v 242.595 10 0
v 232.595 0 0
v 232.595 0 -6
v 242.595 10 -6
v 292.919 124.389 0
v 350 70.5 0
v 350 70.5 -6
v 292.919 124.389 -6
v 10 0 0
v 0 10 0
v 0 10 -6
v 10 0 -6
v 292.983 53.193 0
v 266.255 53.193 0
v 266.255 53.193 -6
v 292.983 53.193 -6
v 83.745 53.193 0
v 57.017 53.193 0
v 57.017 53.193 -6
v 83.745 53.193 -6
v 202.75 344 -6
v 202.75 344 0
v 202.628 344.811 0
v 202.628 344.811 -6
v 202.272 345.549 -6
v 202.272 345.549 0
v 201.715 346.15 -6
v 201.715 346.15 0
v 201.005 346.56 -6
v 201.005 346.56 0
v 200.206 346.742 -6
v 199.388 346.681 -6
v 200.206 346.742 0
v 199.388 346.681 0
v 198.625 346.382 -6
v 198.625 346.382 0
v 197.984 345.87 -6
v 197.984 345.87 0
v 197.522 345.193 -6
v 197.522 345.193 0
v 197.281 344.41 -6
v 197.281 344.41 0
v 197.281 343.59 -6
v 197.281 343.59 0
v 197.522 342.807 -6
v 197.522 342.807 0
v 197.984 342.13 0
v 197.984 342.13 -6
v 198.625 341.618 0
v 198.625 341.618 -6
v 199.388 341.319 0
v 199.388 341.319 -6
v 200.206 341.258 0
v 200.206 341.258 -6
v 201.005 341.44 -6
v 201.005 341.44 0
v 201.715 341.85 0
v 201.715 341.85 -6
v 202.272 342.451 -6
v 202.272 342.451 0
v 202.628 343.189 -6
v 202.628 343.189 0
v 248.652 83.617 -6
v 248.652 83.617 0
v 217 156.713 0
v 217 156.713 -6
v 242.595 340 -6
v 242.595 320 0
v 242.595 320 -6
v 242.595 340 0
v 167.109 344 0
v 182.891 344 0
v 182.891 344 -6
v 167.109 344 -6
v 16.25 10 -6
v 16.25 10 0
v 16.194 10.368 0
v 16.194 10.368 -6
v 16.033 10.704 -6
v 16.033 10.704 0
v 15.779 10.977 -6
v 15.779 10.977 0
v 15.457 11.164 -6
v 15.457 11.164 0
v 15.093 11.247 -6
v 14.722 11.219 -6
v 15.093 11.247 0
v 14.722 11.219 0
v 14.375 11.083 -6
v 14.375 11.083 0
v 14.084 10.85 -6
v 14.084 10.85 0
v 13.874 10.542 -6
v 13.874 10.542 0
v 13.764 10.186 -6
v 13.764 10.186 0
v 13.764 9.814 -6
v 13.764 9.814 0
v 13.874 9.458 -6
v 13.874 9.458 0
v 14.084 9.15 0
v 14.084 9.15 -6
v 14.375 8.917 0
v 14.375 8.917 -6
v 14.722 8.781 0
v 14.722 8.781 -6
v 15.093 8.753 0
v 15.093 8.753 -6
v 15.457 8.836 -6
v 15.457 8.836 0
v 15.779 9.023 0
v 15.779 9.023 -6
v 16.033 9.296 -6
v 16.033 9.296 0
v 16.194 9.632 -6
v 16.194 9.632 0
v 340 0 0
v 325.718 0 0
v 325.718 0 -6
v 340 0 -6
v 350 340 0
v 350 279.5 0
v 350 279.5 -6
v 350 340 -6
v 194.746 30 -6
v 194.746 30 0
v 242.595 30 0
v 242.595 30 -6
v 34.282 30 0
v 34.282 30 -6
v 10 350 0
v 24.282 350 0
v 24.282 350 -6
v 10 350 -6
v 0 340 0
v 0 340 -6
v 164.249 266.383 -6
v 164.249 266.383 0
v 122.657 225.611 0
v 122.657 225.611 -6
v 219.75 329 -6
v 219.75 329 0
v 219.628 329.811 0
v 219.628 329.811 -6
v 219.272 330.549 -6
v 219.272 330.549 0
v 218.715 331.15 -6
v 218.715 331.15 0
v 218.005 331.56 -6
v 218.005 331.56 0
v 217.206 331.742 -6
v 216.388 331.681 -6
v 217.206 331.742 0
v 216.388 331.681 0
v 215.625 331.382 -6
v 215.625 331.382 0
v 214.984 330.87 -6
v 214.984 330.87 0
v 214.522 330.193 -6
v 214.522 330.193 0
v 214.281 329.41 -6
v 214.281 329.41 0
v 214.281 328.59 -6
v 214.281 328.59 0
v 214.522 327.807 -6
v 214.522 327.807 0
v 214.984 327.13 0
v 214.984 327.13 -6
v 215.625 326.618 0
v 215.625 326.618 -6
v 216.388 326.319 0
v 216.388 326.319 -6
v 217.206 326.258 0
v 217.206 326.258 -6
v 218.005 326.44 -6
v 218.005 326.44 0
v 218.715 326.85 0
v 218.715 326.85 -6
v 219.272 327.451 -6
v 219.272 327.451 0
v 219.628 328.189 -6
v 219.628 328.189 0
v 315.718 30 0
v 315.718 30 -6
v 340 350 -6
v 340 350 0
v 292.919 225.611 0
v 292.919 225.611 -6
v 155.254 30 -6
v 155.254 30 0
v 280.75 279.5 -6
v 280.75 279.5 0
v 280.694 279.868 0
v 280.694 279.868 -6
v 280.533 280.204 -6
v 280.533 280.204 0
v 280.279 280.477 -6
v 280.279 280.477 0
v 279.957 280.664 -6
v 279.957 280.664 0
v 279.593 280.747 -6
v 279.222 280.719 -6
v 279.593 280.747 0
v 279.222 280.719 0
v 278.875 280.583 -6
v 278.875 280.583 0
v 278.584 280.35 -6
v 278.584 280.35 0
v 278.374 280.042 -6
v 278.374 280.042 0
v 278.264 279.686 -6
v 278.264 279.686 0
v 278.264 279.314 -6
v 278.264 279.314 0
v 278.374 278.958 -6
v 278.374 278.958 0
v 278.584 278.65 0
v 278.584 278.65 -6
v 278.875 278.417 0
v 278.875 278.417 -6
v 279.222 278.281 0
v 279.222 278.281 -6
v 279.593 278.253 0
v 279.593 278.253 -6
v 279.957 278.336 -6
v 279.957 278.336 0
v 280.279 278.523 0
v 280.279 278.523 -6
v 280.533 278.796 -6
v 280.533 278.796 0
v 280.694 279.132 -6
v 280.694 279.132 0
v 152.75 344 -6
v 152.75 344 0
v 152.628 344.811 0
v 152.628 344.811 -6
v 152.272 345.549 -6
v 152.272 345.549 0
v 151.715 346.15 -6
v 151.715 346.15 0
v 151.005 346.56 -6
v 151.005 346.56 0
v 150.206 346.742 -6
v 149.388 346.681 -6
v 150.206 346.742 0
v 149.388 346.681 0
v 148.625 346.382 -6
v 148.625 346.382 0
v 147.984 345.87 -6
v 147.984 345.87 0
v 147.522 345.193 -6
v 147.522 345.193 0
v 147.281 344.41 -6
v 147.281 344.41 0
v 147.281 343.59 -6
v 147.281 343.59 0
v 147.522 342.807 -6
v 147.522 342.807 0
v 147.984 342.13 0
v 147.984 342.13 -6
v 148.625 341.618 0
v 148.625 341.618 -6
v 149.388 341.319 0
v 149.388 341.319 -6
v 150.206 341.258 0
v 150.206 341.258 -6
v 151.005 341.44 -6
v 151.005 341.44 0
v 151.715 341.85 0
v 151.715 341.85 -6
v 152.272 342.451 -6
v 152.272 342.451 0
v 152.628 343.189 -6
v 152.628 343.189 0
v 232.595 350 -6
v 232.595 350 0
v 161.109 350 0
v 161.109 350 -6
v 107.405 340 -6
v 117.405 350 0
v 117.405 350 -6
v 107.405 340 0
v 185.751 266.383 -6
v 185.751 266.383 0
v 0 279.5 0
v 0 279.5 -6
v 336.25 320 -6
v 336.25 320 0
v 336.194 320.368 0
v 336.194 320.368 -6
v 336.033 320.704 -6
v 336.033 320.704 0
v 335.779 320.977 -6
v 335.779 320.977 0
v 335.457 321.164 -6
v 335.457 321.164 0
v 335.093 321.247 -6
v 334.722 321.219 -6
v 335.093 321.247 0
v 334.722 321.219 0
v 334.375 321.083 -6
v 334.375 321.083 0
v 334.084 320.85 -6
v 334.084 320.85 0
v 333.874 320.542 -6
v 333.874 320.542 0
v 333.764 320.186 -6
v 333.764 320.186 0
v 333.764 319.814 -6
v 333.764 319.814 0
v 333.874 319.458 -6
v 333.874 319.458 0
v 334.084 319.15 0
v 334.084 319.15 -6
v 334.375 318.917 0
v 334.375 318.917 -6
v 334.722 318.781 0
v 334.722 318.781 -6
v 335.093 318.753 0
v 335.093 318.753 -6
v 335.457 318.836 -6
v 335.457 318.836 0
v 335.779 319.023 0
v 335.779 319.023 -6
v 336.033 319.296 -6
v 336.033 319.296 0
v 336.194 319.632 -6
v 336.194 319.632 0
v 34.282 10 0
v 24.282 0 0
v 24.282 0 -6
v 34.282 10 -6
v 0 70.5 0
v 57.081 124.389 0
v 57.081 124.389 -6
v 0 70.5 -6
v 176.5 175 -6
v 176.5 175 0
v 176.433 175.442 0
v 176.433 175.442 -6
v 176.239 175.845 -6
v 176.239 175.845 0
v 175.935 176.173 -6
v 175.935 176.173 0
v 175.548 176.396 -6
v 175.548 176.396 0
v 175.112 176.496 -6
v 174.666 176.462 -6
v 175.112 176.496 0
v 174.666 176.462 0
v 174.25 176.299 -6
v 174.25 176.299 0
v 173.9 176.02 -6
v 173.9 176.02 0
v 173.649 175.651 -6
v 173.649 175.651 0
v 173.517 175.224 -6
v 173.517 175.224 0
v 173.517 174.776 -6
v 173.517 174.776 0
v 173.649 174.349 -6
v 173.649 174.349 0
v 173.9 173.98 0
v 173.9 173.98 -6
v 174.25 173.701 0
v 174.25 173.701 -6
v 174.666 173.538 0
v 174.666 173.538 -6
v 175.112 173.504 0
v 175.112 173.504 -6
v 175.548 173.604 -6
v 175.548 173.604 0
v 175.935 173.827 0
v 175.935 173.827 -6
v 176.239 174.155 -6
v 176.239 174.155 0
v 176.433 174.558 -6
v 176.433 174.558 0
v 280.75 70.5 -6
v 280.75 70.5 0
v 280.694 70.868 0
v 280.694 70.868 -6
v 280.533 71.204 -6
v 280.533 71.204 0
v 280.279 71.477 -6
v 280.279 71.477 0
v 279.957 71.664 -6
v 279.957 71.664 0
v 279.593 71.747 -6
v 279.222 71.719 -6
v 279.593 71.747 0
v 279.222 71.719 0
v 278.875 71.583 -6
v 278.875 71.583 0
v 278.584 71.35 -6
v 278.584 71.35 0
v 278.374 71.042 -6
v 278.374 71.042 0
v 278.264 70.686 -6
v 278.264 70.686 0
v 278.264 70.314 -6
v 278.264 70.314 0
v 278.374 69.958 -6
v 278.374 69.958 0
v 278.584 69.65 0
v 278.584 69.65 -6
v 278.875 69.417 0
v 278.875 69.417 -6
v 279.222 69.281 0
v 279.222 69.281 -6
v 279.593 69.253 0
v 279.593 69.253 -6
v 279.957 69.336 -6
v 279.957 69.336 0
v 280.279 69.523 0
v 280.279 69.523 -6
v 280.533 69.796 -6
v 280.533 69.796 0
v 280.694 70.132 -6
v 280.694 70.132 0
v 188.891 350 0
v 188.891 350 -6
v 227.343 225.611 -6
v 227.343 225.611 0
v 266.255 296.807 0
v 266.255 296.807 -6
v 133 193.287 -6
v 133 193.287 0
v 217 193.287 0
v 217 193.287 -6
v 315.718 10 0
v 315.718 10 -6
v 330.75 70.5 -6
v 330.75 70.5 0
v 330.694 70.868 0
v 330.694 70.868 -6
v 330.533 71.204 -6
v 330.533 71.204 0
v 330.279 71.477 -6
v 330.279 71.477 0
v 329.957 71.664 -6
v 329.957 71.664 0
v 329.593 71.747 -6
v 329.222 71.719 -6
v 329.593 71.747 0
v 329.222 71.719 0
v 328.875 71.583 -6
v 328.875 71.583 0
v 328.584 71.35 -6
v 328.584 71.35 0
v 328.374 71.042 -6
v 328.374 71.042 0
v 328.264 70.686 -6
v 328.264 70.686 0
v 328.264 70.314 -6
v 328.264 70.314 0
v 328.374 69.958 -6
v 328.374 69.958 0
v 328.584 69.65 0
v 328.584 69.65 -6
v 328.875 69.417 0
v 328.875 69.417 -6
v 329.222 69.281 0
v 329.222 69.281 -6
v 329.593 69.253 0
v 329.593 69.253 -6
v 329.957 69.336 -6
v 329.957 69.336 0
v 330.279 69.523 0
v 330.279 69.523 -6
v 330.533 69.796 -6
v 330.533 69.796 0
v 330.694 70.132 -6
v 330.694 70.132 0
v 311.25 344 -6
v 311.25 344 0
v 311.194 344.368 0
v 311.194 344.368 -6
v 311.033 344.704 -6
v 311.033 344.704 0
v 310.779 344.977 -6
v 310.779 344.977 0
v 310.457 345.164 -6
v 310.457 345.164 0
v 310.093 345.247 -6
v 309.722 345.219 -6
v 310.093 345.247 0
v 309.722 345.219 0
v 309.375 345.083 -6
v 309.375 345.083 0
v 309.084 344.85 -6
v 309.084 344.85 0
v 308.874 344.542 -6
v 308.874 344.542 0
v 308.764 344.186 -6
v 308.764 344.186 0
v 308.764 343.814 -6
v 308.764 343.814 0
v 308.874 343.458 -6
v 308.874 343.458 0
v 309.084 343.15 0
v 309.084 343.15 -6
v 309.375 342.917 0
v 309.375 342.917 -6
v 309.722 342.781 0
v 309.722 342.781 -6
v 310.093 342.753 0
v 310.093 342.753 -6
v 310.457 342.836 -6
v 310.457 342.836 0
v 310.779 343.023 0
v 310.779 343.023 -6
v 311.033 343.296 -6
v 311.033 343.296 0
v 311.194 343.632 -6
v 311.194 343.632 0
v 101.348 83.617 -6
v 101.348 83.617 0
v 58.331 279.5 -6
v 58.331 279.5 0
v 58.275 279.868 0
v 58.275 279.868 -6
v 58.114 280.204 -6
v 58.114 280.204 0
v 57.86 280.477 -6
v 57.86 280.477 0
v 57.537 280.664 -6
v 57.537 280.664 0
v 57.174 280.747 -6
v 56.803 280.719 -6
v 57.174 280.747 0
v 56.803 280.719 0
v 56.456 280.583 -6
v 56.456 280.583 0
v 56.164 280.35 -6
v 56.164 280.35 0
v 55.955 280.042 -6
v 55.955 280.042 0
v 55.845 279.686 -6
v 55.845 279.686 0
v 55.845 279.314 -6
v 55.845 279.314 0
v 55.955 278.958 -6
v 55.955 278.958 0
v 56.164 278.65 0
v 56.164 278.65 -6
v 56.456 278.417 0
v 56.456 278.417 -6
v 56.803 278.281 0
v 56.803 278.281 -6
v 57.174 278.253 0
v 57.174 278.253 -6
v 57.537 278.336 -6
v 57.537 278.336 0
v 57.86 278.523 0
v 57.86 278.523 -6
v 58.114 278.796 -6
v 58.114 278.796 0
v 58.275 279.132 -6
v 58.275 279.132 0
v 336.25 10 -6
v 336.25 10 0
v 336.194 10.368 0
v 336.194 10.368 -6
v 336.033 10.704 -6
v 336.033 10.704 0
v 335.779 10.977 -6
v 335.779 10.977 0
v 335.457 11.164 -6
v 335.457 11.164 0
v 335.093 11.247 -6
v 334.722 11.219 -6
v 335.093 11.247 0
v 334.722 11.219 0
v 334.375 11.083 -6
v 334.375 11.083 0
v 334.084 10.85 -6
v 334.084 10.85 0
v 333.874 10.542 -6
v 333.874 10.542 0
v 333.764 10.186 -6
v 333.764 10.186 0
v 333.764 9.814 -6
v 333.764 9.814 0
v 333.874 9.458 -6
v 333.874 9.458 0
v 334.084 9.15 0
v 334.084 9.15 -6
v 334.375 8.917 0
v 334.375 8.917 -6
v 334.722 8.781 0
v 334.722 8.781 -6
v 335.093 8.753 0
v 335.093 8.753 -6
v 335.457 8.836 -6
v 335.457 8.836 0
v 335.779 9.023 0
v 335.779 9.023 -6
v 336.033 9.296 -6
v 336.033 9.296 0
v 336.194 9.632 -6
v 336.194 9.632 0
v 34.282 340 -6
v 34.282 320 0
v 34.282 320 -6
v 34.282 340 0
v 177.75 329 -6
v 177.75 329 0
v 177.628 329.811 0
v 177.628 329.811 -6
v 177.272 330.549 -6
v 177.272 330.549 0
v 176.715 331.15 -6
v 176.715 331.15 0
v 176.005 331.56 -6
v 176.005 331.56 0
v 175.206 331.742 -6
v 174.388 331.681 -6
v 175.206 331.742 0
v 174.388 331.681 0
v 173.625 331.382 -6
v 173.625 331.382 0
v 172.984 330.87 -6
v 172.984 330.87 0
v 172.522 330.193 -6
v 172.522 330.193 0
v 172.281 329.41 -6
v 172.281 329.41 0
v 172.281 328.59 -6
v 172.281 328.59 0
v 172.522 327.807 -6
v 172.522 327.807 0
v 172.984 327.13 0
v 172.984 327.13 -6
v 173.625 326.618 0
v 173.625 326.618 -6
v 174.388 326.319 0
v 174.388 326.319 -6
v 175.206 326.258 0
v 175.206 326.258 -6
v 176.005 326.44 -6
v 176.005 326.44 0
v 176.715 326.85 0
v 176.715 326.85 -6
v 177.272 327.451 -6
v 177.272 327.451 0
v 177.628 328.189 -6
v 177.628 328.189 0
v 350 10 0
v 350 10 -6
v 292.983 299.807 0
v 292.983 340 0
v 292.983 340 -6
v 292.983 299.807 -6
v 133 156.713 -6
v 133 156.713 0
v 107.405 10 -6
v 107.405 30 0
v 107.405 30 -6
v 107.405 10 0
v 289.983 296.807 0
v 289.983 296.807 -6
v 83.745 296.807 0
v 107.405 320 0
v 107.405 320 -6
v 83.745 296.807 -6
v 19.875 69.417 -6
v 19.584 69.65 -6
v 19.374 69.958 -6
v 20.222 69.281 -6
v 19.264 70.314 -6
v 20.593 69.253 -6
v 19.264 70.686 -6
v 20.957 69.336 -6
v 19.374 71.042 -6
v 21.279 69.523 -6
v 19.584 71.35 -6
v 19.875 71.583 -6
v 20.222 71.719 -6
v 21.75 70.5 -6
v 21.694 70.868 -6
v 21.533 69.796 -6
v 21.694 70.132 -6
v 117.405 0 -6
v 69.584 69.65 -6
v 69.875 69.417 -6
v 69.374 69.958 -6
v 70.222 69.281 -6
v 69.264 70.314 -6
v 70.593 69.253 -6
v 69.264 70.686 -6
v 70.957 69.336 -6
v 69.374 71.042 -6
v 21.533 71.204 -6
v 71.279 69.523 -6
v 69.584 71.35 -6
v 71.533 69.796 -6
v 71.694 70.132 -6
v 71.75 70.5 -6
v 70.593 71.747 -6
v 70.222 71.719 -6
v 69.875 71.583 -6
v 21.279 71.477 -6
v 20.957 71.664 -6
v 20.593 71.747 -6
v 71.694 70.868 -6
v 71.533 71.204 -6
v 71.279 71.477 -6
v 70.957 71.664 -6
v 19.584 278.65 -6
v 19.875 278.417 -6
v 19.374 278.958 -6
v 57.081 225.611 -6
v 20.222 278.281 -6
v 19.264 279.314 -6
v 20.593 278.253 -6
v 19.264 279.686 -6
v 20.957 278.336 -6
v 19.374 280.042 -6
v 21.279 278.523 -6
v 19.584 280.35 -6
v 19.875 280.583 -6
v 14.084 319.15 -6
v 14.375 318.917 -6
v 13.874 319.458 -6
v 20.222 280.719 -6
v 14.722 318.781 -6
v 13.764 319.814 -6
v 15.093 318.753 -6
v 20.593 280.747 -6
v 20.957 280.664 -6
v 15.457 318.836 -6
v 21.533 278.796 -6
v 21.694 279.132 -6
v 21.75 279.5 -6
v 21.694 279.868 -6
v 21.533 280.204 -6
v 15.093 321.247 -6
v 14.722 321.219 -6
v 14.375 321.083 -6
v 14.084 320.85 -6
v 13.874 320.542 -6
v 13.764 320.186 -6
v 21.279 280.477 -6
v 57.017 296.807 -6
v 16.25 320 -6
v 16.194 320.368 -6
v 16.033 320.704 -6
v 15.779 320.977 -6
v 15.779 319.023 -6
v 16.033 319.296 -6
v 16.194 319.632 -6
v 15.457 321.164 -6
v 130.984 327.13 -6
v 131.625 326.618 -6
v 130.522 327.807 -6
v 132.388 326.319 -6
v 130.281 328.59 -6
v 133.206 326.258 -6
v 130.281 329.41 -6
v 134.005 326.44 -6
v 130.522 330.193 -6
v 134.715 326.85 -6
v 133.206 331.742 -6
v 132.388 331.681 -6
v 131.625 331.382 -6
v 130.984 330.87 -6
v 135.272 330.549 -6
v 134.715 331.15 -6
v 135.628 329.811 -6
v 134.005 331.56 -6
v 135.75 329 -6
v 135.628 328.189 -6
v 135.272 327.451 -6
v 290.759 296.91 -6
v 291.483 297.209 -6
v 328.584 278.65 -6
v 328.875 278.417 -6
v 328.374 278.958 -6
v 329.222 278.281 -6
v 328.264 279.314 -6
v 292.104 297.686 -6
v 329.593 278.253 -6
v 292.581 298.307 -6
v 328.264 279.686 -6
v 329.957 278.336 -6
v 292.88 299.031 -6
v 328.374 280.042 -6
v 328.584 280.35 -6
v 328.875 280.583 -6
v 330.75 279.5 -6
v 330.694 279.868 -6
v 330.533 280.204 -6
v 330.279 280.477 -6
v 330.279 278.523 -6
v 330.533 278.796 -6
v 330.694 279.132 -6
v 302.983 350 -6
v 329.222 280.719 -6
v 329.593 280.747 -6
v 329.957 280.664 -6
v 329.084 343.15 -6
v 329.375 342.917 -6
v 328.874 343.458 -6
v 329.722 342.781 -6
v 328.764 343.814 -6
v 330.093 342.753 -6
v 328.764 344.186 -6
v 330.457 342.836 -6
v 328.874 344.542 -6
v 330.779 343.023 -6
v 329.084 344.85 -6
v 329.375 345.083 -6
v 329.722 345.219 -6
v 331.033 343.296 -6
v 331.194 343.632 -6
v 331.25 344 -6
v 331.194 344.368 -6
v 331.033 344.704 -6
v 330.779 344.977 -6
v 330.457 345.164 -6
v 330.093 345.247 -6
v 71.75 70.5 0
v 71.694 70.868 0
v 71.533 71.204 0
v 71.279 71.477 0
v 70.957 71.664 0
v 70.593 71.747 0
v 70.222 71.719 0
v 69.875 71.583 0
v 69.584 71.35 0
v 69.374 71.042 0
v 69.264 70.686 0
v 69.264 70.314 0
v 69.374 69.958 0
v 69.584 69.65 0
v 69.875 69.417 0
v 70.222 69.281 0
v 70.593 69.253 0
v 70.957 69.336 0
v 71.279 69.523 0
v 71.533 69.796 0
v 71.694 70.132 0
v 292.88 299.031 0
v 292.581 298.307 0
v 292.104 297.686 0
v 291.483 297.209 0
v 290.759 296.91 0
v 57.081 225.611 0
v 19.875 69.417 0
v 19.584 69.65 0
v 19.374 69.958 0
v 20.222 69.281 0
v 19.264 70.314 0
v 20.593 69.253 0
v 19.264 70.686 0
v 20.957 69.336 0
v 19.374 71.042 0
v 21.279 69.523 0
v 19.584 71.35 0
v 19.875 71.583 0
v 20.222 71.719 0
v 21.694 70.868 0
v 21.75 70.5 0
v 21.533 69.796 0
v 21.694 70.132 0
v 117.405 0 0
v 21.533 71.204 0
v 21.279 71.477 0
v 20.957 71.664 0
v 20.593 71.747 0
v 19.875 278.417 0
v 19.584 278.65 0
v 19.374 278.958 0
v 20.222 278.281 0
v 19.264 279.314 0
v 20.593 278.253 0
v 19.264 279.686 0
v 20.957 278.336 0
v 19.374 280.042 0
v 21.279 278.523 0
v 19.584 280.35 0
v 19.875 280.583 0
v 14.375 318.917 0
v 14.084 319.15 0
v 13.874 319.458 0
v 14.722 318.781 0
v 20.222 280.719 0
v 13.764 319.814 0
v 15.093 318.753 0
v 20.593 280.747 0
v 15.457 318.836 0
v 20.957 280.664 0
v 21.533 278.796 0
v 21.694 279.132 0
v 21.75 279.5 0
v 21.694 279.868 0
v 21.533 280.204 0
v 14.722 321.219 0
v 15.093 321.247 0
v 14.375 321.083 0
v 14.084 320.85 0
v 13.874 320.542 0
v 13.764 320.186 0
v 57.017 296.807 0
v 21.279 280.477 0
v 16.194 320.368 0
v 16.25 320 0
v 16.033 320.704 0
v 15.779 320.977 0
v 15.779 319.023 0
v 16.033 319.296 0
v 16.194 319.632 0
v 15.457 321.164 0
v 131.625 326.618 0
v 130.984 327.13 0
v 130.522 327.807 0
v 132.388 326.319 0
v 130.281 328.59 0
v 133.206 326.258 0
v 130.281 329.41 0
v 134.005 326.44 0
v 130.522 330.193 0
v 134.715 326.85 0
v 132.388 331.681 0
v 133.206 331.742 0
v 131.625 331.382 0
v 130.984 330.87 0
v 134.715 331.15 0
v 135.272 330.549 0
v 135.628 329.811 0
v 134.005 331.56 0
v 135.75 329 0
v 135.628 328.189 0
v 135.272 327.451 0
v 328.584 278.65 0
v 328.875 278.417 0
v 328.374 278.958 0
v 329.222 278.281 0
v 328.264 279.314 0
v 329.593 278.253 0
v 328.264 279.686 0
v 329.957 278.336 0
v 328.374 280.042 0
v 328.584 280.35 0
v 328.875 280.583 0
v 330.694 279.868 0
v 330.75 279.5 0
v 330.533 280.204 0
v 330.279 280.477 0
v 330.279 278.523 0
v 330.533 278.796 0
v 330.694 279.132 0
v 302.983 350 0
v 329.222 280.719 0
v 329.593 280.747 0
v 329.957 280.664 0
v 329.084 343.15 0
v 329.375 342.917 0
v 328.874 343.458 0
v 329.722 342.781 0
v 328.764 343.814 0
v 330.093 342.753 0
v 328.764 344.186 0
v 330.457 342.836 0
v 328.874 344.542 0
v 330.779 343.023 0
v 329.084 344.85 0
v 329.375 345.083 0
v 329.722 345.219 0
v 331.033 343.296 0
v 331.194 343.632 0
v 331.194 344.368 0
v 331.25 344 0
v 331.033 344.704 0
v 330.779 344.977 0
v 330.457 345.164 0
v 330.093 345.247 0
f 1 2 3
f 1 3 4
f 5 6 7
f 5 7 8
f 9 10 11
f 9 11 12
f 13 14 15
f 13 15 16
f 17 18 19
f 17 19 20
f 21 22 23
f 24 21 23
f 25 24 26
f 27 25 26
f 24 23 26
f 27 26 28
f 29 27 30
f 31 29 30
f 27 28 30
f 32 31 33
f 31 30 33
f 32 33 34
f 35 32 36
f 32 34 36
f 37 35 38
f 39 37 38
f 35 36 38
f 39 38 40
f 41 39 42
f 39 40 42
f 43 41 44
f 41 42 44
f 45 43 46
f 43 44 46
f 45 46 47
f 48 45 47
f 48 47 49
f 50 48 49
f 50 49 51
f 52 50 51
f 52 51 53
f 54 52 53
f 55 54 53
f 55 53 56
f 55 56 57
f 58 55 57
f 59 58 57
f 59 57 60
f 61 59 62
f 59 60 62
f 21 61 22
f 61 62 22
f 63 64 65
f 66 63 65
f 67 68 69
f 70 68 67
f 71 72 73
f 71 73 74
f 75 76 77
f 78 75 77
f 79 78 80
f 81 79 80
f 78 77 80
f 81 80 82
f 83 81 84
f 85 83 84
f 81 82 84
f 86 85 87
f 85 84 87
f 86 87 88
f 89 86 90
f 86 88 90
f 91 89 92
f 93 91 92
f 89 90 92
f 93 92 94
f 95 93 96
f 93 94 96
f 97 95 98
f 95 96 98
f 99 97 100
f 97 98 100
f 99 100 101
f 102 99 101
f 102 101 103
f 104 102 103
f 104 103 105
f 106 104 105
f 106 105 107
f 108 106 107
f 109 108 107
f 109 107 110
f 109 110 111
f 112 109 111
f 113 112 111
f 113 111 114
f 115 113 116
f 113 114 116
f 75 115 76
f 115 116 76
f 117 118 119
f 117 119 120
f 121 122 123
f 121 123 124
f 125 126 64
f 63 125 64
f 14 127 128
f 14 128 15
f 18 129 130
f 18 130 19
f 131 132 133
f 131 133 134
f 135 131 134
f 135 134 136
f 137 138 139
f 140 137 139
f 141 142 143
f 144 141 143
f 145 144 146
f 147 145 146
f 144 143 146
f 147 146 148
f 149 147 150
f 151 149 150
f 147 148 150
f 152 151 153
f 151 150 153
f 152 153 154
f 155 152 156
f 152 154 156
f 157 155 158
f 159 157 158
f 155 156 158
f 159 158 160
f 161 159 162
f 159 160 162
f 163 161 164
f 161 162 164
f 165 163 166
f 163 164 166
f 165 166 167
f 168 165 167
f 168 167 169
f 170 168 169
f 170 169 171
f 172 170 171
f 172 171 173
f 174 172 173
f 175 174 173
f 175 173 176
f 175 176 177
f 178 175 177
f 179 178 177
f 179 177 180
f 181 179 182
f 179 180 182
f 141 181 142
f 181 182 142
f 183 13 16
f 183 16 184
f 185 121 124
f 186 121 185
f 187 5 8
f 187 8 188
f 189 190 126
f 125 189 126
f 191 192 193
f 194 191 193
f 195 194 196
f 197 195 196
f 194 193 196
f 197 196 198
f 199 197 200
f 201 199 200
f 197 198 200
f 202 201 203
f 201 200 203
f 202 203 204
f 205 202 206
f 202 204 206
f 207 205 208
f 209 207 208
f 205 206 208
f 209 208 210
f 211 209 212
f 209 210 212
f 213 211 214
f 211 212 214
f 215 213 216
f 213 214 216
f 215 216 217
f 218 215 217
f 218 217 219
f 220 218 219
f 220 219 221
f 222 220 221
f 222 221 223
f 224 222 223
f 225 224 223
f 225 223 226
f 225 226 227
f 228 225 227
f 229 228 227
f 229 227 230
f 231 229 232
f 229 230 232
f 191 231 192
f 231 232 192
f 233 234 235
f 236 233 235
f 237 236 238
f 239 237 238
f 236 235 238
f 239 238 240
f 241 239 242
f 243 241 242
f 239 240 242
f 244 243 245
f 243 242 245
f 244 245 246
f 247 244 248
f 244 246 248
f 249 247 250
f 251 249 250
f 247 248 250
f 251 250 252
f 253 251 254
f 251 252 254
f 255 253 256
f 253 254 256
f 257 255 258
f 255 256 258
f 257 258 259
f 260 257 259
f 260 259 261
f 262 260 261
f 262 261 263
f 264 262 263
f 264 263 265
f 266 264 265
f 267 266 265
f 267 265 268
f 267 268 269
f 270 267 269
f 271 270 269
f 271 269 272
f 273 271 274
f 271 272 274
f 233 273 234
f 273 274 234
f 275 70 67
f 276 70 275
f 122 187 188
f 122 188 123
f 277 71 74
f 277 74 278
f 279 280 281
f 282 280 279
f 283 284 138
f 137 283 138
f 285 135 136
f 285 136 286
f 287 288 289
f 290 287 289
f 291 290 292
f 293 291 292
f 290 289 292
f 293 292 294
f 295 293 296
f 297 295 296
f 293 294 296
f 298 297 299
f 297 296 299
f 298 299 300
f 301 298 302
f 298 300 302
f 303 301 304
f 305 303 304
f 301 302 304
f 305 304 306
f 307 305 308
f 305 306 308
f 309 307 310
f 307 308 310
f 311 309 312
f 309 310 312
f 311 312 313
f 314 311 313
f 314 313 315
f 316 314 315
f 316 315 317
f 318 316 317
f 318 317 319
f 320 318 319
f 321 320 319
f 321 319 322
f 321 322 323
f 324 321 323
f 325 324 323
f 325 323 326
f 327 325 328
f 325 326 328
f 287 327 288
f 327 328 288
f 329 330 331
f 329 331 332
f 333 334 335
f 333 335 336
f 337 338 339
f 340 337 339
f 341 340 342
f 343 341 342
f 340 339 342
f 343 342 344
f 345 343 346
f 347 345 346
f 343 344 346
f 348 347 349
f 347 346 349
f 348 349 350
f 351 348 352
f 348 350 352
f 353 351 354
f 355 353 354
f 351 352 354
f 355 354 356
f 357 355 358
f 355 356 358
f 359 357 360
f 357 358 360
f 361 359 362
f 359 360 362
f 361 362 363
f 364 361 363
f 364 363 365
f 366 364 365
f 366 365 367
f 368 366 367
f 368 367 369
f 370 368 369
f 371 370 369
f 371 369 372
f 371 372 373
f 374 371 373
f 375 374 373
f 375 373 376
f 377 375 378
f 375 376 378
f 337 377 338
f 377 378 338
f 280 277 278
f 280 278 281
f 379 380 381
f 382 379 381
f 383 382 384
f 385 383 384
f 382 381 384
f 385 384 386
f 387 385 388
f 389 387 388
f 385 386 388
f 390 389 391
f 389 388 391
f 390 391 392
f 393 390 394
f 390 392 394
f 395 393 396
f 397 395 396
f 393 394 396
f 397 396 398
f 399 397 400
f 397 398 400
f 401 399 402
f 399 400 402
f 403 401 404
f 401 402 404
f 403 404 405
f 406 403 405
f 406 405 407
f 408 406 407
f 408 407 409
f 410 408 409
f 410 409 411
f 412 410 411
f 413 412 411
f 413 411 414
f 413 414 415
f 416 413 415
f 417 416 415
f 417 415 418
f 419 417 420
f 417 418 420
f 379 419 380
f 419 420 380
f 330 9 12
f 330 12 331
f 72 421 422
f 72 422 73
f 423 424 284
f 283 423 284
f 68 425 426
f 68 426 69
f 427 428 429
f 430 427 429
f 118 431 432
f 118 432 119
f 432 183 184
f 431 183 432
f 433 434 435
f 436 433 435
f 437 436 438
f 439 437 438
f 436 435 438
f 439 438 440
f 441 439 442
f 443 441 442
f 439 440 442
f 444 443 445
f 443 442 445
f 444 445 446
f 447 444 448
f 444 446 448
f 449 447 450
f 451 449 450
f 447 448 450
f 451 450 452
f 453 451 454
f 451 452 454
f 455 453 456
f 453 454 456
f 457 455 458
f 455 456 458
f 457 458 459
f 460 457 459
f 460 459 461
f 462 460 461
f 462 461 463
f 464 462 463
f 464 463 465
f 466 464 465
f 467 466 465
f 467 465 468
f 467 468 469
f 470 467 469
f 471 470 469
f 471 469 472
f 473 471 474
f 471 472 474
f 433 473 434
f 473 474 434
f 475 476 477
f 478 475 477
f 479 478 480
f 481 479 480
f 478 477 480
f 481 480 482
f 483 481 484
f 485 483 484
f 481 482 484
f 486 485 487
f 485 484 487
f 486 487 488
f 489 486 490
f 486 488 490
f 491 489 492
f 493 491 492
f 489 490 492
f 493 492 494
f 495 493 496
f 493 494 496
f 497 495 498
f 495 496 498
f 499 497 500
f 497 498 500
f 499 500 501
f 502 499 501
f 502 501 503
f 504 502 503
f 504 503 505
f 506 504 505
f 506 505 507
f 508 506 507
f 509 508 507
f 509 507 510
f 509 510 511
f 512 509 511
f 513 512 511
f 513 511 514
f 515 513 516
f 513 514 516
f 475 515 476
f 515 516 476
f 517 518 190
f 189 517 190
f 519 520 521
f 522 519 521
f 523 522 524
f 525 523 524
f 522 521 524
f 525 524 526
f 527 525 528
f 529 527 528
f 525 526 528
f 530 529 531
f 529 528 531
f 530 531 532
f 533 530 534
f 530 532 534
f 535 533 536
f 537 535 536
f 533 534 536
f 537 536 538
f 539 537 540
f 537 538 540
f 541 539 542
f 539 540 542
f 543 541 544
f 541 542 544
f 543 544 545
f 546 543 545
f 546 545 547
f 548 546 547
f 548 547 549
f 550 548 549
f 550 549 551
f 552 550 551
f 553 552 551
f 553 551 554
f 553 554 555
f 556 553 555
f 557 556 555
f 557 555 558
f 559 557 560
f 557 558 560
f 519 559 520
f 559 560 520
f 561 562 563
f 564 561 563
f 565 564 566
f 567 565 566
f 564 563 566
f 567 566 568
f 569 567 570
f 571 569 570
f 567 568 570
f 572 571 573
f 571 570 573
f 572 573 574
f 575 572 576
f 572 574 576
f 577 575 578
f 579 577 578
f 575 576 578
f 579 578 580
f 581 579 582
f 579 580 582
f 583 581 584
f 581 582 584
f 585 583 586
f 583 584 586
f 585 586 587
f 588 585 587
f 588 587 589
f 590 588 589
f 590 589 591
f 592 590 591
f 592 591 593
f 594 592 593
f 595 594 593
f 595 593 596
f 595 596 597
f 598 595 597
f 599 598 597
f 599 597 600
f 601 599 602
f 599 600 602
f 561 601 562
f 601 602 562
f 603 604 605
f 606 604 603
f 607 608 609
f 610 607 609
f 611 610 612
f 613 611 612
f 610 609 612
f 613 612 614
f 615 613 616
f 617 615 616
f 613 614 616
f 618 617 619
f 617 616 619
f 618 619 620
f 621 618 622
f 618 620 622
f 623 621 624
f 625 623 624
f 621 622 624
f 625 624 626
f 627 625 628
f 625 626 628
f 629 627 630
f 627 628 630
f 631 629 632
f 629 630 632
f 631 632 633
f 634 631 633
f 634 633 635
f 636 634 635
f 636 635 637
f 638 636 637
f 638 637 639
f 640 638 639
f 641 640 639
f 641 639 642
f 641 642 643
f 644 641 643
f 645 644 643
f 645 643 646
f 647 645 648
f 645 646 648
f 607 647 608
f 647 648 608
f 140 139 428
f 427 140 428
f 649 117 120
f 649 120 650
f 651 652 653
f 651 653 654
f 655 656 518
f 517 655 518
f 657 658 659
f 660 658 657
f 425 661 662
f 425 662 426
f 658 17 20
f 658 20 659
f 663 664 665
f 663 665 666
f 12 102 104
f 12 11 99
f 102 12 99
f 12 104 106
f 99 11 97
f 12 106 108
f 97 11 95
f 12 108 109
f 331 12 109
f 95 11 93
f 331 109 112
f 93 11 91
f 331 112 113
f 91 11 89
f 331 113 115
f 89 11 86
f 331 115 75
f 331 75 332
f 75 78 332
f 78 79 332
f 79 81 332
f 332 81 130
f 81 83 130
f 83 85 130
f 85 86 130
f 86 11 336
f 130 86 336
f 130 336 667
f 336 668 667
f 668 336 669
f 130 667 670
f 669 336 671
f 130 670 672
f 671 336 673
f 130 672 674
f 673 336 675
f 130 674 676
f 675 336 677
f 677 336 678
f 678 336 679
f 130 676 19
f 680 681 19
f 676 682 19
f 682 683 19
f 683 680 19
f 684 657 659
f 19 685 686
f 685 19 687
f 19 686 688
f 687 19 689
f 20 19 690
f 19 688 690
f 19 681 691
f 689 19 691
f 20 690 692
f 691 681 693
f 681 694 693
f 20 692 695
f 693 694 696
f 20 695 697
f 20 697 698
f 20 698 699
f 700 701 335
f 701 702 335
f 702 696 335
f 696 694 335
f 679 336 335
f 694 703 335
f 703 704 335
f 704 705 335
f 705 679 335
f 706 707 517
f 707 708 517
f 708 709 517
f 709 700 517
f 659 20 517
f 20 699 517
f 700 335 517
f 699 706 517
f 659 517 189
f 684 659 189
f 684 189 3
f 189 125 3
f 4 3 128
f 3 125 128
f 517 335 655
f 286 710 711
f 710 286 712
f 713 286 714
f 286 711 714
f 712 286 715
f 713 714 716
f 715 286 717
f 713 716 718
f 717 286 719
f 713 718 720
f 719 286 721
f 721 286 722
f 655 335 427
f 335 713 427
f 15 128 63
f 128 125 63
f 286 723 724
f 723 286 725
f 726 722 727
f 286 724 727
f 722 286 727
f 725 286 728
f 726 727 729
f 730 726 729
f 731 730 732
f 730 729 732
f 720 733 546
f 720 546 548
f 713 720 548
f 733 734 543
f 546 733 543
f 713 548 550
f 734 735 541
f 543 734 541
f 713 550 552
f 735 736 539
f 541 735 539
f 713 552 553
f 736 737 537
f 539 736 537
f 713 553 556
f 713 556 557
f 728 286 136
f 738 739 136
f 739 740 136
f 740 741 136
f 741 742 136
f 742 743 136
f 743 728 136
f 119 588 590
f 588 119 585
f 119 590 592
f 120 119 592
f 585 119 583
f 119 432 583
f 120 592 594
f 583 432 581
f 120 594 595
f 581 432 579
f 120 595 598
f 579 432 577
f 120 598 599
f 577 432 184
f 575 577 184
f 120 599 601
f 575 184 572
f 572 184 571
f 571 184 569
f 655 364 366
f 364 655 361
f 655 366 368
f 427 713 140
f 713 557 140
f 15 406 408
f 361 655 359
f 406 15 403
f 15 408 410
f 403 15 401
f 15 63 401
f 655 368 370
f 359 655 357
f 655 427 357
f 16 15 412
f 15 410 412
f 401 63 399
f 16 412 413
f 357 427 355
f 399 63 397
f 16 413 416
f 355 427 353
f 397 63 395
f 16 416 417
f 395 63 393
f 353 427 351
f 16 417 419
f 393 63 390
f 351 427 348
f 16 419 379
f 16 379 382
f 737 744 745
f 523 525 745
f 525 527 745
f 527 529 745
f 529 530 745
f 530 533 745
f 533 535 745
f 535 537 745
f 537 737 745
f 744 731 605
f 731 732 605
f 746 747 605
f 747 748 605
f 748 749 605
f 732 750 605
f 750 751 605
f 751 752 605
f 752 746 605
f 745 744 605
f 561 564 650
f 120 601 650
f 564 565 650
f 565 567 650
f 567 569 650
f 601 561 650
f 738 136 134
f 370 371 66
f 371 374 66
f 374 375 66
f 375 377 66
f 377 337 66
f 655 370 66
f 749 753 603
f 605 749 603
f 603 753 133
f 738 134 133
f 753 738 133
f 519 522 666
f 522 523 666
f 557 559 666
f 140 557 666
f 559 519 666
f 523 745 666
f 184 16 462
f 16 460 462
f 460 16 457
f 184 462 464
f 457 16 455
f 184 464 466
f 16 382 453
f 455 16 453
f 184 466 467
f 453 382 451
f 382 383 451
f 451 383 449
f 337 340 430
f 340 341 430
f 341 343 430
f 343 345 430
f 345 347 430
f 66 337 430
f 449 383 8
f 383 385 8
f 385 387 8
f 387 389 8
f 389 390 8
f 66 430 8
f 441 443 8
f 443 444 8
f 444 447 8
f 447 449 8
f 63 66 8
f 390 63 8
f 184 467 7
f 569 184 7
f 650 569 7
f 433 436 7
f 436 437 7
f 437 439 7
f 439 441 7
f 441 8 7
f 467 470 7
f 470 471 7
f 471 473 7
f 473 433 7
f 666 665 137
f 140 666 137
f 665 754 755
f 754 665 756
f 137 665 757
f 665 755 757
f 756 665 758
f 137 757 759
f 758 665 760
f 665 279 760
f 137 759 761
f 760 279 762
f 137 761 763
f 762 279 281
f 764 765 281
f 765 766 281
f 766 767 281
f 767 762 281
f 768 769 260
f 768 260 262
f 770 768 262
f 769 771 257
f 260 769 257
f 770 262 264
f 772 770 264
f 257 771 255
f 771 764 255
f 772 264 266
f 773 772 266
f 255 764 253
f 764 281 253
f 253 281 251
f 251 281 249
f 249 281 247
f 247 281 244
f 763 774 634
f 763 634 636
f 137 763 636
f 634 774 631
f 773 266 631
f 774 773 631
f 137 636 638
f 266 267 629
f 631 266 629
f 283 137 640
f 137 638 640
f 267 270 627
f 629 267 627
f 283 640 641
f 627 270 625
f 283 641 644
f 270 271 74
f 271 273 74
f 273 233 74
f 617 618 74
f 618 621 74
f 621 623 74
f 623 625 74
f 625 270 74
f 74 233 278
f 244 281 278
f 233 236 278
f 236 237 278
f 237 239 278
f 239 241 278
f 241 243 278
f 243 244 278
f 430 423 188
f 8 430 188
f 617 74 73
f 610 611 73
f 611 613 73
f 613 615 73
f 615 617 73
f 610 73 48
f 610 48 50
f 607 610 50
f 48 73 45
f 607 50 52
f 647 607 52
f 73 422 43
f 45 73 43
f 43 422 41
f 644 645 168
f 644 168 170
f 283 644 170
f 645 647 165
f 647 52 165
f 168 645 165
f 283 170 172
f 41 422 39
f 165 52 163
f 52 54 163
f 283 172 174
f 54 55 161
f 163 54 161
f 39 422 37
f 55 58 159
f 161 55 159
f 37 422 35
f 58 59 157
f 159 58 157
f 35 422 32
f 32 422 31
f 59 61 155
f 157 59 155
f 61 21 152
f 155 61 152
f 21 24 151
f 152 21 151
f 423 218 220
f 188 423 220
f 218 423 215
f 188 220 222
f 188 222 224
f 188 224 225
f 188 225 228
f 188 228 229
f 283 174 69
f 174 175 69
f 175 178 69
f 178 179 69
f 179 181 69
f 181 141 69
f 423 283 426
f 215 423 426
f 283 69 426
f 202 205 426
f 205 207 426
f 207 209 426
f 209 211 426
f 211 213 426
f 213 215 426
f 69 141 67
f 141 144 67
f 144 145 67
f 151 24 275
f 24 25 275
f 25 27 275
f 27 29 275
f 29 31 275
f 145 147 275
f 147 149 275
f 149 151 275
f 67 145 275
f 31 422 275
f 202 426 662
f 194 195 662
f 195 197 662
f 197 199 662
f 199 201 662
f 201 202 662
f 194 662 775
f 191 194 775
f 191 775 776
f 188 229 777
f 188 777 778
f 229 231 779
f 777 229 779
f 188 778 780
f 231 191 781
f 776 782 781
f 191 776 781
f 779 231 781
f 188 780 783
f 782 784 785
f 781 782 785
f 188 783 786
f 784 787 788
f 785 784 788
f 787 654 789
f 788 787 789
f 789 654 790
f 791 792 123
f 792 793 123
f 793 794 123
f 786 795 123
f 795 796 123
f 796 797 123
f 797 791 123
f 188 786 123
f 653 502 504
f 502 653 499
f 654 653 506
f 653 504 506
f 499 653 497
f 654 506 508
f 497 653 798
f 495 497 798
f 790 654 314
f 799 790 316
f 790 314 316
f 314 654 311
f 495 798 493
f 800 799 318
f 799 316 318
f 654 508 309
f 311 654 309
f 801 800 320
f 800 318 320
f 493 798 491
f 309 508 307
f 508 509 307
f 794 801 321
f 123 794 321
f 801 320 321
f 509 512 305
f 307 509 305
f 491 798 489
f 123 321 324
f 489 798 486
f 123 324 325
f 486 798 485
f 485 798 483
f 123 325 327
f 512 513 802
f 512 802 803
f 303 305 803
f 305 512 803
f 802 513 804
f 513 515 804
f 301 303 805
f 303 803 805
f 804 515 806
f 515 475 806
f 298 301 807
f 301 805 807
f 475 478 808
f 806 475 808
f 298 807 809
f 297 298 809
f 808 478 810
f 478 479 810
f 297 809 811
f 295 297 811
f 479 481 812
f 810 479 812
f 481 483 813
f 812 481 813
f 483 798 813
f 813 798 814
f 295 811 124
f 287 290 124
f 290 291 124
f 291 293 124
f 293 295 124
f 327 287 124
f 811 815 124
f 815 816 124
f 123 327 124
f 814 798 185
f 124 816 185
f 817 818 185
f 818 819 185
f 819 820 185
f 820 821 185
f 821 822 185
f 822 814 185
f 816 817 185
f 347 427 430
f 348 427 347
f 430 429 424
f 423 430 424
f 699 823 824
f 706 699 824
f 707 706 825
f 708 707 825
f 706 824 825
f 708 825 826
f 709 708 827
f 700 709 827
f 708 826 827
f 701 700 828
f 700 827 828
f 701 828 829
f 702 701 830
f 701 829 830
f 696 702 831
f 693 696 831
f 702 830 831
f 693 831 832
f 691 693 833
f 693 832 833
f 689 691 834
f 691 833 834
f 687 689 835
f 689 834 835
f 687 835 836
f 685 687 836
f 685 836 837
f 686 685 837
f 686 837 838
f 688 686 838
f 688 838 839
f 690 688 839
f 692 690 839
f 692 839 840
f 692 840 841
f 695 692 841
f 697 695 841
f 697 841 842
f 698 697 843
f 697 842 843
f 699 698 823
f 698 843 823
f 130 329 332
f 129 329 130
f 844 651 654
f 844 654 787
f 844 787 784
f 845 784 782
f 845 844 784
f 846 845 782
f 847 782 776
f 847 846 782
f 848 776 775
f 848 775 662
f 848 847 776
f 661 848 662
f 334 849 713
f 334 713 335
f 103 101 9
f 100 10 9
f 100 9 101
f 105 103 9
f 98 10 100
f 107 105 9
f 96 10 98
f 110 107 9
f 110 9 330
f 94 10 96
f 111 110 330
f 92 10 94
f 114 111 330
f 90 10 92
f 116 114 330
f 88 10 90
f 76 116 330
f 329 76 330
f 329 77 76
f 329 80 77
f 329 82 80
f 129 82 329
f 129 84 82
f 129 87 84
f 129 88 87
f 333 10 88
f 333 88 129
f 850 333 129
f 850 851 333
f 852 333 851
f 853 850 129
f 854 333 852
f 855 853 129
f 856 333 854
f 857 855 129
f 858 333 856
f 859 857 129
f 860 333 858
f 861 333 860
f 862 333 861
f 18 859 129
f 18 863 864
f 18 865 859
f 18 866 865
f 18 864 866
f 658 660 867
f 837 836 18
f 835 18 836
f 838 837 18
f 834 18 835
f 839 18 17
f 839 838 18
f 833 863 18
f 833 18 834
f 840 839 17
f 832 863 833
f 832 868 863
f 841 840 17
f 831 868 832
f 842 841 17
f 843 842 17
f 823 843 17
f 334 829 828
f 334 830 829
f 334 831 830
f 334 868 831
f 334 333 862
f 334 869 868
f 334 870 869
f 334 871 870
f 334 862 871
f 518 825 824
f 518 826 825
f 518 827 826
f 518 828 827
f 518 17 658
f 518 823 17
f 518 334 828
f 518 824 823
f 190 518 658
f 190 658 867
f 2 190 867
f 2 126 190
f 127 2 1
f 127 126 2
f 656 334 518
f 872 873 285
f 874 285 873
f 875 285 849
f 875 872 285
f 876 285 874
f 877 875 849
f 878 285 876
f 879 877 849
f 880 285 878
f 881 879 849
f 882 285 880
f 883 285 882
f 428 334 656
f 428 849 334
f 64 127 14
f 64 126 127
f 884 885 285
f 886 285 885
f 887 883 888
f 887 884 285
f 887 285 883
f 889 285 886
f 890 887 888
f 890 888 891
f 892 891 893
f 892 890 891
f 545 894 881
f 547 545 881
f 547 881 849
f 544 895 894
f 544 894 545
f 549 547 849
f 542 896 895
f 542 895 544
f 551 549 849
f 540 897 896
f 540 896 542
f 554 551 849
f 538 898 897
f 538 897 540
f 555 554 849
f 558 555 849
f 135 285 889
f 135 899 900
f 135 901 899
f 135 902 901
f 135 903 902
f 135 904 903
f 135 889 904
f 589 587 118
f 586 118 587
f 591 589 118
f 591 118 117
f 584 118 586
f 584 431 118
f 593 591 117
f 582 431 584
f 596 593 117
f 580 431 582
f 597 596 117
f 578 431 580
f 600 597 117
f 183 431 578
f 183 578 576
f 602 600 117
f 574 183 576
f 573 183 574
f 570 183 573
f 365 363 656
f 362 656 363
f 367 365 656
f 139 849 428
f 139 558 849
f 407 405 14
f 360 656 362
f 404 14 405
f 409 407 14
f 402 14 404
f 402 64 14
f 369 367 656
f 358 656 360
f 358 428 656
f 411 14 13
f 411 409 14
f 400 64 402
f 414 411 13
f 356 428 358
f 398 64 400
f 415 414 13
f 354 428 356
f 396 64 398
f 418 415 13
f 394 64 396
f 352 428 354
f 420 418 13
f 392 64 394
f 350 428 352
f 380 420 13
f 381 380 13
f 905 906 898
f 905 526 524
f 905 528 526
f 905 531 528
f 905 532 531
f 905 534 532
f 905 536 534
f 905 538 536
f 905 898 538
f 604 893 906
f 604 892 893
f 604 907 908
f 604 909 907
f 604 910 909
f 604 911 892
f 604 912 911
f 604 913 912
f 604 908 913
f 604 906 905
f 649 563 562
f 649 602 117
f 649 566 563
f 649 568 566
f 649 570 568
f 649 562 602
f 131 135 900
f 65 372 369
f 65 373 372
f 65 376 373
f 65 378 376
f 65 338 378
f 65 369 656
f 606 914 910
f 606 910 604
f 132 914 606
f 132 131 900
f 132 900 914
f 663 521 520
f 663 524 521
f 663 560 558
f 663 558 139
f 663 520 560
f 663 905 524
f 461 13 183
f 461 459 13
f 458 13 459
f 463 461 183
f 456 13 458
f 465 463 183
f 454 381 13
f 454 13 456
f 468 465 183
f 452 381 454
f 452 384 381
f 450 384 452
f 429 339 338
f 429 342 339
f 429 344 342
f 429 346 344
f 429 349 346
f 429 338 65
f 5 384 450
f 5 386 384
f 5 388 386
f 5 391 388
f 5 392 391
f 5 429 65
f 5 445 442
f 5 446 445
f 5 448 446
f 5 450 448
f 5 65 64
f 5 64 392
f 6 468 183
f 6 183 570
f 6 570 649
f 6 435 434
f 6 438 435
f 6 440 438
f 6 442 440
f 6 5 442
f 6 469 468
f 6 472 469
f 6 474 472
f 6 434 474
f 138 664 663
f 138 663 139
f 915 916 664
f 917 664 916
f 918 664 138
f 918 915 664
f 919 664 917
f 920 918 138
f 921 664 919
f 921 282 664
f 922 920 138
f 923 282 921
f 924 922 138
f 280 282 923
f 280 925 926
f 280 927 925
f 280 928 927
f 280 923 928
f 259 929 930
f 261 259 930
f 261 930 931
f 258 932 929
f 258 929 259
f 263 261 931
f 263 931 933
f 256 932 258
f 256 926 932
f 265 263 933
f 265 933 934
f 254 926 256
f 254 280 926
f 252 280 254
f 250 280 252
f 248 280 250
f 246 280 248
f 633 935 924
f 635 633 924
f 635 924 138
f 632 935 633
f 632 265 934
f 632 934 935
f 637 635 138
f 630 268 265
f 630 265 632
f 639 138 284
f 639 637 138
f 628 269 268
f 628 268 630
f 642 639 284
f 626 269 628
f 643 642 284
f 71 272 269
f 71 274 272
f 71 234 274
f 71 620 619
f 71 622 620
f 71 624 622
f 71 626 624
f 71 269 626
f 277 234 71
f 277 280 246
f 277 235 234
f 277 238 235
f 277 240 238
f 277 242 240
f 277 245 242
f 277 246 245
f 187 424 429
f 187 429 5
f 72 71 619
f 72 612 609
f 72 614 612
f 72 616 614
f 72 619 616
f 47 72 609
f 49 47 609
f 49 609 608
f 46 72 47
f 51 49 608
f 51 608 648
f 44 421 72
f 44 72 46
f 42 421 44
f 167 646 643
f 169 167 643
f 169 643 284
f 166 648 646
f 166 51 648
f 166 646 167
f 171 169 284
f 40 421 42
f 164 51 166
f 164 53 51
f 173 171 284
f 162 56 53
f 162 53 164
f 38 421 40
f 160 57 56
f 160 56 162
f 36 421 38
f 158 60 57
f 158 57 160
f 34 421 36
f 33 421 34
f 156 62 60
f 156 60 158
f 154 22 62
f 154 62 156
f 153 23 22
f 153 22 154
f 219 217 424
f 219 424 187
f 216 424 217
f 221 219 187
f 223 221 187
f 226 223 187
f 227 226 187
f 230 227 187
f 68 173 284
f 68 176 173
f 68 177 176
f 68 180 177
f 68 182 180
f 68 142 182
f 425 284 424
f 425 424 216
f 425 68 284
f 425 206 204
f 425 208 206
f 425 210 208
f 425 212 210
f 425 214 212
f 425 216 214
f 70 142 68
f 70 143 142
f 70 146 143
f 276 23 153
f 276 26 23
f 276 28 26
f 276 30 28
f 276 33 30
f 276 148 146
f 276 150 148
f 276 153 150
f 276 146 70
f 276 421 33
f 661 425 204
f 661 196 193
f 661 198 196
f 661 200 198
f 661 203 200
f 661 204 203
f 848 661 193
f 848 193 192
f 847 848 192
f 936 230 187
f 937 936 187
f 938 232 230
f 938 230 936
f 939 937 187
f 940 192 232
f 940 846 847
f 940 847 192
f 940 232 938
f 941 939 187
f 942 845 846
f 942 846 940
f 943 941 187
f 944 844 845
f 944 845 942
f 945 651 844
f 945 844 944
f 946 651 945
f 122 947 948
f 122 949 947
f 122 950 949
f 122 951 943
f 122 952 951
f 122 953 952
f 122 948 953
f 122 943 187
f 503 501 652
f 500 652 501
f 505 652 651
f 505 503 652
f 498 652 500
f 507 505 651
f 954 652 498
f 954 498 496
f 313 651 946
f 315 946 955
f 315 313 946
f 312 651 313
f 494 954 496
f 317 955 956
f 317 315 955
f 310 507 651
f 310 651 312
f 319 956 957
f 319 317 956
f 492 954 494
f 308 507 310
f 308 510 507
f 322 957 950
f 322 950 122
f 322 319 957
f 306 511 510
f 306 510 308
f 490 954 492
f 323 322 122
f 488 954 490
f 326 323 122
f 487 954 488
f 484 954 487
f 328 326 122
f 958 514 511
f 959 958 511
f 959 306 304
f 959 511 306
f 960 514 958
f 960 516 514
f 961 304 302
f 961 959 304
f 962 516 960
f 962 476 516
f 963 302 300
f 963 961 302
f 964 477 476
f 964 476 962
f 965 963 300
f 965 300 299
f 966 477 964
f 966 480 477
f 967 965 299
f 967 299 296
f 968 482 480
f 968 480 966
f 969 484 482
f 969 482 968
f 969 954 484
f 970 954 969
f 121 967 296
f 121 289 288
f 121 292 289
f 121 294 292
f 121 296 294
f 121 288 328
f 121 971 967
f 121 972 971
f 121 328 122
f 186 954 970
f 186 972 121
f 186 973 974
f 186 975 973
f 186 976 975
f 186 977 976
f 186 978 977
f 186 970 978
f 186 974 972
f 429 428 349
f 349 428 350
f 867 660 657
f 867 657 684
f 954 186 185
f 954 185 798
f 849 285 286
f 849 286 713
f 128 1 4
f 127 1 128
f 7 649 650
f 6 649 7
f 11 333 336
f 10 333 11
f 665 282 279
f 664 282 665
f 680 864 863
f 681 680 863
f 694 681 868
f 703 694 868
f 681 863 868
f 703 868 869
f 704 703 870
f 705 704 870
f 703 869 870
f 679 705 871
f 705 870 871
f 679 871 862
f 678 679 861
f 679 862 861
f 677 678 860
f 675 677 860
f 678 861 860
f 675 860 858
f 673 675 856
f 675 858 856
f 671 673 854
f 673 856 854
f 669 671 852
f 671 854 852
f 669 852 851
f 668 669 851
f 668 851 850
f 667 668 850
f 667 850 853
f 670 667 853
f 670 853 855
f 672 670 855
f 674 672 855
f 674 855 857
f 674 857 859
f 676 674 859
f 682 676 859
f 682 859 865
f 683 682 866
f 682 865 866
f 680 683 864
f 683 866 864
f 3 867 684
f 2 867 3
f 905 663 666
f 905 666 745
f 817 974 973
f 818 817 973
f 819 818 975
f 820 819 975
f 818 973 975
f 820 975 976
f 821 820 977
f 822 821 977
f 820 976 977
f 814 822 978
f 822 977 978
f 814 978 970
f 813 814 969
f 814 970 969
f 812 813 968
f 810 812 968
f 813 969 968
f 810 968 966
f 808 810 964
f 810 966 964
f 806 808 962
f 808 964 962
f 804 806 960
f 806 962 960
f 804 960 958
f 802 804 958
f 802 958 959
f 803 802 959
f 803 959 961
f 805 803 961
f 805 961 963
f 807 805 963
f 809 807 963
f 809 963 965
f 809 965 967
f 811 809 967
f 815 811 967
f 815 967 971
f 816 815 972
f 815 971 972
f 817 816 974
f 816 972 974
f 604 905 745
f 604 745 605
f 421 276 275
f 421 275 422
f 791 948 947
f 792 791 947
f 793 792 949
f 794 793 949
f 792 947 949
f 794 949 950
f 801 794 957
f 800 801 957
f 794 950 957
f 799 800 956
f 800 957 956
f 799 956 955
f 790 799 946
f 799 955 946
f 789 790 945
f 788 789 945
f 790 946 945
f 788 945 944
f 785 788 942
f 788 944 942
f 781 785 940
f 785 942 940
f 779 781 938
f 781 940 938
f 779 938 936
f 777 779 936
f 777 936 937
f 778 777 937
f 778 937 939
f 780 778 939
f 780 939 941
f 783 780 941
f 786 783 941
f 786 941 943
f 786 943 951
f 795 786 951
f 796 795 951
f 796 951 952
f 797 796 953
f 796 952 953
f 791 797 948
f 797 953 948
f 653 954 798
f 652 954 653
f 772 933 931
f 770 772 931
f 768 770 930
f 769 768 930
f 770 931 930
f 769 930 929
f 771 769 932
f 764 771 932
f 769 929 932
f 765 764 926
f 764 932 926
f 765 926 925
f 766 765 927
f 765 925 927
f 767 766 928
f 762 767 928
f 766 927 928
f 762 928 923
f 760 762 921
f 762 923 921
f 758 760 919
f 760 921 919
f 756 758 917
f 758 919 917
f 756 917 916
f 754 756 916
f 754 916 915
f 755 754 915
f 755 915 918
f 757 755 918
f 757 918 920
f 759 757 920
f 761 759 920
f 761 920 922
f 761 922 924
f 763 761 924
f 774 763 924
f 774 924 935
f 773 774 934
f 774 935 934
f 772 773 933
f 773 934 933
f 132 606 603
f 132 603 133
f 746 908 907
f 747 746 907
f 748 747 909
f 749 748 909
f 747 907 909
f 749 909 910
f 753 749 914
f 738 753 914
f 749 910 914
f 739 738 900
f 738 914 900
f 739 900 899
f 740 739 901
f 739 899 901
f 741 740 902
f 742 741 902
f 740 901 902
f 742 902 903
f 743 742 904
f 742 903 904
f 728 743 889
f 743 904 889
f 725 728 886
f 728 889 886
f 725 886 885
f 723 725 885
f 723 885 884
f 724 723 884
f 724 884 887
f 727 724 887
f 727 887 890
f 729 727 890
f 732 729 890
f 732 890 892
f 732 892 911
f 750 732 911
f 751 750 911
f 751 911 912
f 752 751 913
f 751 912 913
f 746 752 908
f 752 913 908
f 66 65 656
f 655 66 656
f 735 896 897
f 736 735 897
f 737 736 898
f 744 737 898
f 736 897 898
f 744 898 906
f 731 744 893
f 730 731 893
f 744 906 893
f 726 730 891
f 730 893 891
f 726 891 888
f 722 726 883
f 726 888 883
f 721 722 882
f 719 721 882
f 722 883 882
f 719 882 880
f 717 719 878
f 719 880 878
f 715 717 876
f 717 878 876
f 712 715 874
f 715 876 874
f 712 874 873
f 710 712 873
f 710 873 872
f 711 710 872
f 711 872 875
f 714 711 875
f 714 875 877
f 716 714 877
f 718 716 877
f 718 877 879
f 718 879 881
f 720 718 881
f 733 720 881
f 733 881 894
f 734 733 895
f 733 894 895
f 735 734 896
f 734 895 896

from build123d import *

# Parameters (mm, degrees)
SCHIZZO13_R                  = 1.25
SCHIZZO13_R_2                = 1.5
SCHIZZO13_R_3                = 2.75
ESTRUSIONE_ESTRUSIONE2_DEPTH = 6


with BuildPart() as part:
    # Schizzo13 → Estrusione-Estrusione2 (new body)
    with BuildSketch(Plane.XY):
        with BuildLine():
            Line((10, 0), (24.28195797, 0))
            Line((24.28195797, 0), (34.28195797, 10))
            Line((34.28195797, 10), (34.28195797, 30))
            Line((34.28195797, 30), (57.017366293, 53.192694567))
            Line((57.017366293, 53.192694567), (83.745372993, 53.192694567))
            Line((83.745372993, 53.192694567), (107.404551383, 30))
            Line((107.404551383, 30), (107.404551383, 10))
            Line((107.404551383, 10), (117.404551383, 0))
            Line((117.404551383, 0), (232.595448617, 0))
            Line((232.595448617, 0), (242.595448617, 10))
            Line((242.595448617, 10), (242.595448617, 30))
            Line((242.595448617, 30), (266.254627007, 53.192694567))
            Line((266.254627007, 53.192694567), (292.982633707, 53.192694567))
            Line((292.982633707, 53.192694567), (315.71804203, 30))
            Line((315.71804203, 30), (315.71804203, 10))
            Line((315.71804203, 10), (325.71804203, 0))
            Line((325.71804203, 0), (340, 0))
            Line((340, 0), (350, 10))
            Line((350, 10), (350, 70.5))
            Line((350, 70.5), (292.919241786, 124.388863529))
            Line((292.919241786, 124.388863529), (292.919241786, 225.611136471))
            Line((292.919241786, 225.611136471), (350, 279.5))
            Line((350, 279.5), (350, 340))
            Line((350, 340), (340, 350))
            Line((340, 350), (302.982633707, 350))
            Line((302.982633707, 350), (292.982633707, 340))
            Line((292.982633707, 340), (292.982633707, 299.807305433))
            ThreePointArc((292.982633707, 299.807305433), (292.103954051, 297.685985089), (289.982633707, 296.807305433))
            Line((289.982633707, 296.807305433), (266.254627007, 296.807305433))
            Line((266.254627007, 296.807305433), (242.595448617, 320))
            Line((242.595448617, 320), (242.595448617, 340))
            Line((242.595448617, 340), (232.595448617, 350))
            Line((232.595448617, 350), (188.89112909, 350))
            Line((188.89112909, 350), (182.89112909, 344))
            Line((182.89112909, 344), (167.10887091, 344))
            Line((167.10887091, 344), (161.10887091, 350))
            Line((161.10887091, 350), (117.404551383, 350))
            Line((117.404551383, 350), (107.404551383, 340))
            Line((107.404551383, 340), (107.404551383, 320))
            Line((107.404551383, 320), (83.745372993, 296.807305433))
            Line((83.745372993, 296.807305433), (57.017366293, 296.807305433))
            Line((57.017366293, 296.807305433), (34.28195797, 320))
            Line((34.28195797, 320), (34.28195797, 340))
            Line((34.28195797, 340), (24.28195797, 350))
            Line((24.28195797, 350), (10, 350))
            Line((10, 350), (0, 340))
            Line((0, 340), (0, 279.5))
            Line((0, 279.5), (57.080758214, 225.611136471))
            Line((57.080758214, 225.611136471), (57.080758214, 175))
            Line((57.080758214, 175), (57.080758214, 124.388863529))
            Line((57.080758214, 124.388863529), (0, 70.5))
            Line((0, 70.5), (0, 10))
            Line((0, 10), (10, 0))
        make_face()
        with Locations((15, 320)):
            Circle(SCHIZZO13_R, mode=Mode.SUBTRACT)
        with Locations((20.5, 279.5)):
            Circle(SCHIZZO13_R, mode=Mode.SUBTRACT)
        with Locations((57.080758214, 279.5)):
            Circle(SCHIZZO13_R, mode=Mode.SUBTRACT)
        with Locations((175, 175)):
            Circle(SCHIZZO13_R_2, mode=Mode.SUBTRACT)
        with Locations((20.5, 70.5)):
            Circle(SCHIZZO13_R, mode=Mode.SUBTRACT)
        with Locations((200, 344)):
            Circle(SCHIZZO13_R_3, mode=Mode.SUBTRACT)
        with Locations((150, 344)):
            Circle(SCHIZZO13_R_3, mode=Mode.SUBTRACT)
        with Locations((175, 329)):
            Circle(SCHIZZO13_R_3, mode=Mode.SUBTRACT)
        with Locations((217, 329)):
            Circle(SCHIZZO13_R_3, mode=Mode.SUBTRACT)
        with Locations((133, 329)):
            Circle(SCHIZZO13_R_3, mode=Mode.SUBTRACT)
        with Locations((70.5, 70.5)):
            Circle(SCHIZZO13_R, mode=Mode.SUBTRACT)
        with Locations((279.5, 70.5)):
            Circle(SCHIZZO13_R, mode=Mode.SUBTRACT)
        with Locations((329.5, 70.5)):
            Circle(SCHIZZO13_R, mode=Mode.SUBTRACT)
        with Locations((335, 10)):
            Circle(SCHIZZO13_R, mode=Mode.SUBTRACT)
        with Locations((15, 10)):
            Circle(SCHIZZO13_R, mode=Mode.SUBTRACT)
        with Locations((279.5, 279.5)):
            Circle(SCHIZZO13_R, mode=Mode.SUBTRACT)
        with Locations((329.5, 279.5)):
            Circle(SCHIZZO13_R, mode=Mode.SUBTRACT)
        with Locations((335, 320)):
            Circle(SCHIZZO13_R, mode=Mode.SUBTRACT)
        with Locations((310, 344)):
            Circle(SCHIZZO13_R, mode=Mode.SUBTRACT)
        with Locations((330, 344)):
            Circle(SCHIZZO13_R, mode=Mode.SUBTRACT)
        Polygon((217, 193.286910978), (227.343033378, 225.611136471), (185.750894453, 266.383210572), (164.249105547, 266.383210572), (122.656966622, 225.611136471), (133, 193.286910978), align=None, mode=Mode.SUBTRACT)
        Polygon((133, 156.713089022), (101.348199345, 83.616789428), (155.254193112, 30), (194.745806888, 30), (248.651800655, 83.616789428), (217, 156.713089022), align=None, mode=Mode.SUBTRACT)
    extrude(amount=-ESTRUSIONE_ESTRUSIONE2_DEPTH)


solid = part.part
